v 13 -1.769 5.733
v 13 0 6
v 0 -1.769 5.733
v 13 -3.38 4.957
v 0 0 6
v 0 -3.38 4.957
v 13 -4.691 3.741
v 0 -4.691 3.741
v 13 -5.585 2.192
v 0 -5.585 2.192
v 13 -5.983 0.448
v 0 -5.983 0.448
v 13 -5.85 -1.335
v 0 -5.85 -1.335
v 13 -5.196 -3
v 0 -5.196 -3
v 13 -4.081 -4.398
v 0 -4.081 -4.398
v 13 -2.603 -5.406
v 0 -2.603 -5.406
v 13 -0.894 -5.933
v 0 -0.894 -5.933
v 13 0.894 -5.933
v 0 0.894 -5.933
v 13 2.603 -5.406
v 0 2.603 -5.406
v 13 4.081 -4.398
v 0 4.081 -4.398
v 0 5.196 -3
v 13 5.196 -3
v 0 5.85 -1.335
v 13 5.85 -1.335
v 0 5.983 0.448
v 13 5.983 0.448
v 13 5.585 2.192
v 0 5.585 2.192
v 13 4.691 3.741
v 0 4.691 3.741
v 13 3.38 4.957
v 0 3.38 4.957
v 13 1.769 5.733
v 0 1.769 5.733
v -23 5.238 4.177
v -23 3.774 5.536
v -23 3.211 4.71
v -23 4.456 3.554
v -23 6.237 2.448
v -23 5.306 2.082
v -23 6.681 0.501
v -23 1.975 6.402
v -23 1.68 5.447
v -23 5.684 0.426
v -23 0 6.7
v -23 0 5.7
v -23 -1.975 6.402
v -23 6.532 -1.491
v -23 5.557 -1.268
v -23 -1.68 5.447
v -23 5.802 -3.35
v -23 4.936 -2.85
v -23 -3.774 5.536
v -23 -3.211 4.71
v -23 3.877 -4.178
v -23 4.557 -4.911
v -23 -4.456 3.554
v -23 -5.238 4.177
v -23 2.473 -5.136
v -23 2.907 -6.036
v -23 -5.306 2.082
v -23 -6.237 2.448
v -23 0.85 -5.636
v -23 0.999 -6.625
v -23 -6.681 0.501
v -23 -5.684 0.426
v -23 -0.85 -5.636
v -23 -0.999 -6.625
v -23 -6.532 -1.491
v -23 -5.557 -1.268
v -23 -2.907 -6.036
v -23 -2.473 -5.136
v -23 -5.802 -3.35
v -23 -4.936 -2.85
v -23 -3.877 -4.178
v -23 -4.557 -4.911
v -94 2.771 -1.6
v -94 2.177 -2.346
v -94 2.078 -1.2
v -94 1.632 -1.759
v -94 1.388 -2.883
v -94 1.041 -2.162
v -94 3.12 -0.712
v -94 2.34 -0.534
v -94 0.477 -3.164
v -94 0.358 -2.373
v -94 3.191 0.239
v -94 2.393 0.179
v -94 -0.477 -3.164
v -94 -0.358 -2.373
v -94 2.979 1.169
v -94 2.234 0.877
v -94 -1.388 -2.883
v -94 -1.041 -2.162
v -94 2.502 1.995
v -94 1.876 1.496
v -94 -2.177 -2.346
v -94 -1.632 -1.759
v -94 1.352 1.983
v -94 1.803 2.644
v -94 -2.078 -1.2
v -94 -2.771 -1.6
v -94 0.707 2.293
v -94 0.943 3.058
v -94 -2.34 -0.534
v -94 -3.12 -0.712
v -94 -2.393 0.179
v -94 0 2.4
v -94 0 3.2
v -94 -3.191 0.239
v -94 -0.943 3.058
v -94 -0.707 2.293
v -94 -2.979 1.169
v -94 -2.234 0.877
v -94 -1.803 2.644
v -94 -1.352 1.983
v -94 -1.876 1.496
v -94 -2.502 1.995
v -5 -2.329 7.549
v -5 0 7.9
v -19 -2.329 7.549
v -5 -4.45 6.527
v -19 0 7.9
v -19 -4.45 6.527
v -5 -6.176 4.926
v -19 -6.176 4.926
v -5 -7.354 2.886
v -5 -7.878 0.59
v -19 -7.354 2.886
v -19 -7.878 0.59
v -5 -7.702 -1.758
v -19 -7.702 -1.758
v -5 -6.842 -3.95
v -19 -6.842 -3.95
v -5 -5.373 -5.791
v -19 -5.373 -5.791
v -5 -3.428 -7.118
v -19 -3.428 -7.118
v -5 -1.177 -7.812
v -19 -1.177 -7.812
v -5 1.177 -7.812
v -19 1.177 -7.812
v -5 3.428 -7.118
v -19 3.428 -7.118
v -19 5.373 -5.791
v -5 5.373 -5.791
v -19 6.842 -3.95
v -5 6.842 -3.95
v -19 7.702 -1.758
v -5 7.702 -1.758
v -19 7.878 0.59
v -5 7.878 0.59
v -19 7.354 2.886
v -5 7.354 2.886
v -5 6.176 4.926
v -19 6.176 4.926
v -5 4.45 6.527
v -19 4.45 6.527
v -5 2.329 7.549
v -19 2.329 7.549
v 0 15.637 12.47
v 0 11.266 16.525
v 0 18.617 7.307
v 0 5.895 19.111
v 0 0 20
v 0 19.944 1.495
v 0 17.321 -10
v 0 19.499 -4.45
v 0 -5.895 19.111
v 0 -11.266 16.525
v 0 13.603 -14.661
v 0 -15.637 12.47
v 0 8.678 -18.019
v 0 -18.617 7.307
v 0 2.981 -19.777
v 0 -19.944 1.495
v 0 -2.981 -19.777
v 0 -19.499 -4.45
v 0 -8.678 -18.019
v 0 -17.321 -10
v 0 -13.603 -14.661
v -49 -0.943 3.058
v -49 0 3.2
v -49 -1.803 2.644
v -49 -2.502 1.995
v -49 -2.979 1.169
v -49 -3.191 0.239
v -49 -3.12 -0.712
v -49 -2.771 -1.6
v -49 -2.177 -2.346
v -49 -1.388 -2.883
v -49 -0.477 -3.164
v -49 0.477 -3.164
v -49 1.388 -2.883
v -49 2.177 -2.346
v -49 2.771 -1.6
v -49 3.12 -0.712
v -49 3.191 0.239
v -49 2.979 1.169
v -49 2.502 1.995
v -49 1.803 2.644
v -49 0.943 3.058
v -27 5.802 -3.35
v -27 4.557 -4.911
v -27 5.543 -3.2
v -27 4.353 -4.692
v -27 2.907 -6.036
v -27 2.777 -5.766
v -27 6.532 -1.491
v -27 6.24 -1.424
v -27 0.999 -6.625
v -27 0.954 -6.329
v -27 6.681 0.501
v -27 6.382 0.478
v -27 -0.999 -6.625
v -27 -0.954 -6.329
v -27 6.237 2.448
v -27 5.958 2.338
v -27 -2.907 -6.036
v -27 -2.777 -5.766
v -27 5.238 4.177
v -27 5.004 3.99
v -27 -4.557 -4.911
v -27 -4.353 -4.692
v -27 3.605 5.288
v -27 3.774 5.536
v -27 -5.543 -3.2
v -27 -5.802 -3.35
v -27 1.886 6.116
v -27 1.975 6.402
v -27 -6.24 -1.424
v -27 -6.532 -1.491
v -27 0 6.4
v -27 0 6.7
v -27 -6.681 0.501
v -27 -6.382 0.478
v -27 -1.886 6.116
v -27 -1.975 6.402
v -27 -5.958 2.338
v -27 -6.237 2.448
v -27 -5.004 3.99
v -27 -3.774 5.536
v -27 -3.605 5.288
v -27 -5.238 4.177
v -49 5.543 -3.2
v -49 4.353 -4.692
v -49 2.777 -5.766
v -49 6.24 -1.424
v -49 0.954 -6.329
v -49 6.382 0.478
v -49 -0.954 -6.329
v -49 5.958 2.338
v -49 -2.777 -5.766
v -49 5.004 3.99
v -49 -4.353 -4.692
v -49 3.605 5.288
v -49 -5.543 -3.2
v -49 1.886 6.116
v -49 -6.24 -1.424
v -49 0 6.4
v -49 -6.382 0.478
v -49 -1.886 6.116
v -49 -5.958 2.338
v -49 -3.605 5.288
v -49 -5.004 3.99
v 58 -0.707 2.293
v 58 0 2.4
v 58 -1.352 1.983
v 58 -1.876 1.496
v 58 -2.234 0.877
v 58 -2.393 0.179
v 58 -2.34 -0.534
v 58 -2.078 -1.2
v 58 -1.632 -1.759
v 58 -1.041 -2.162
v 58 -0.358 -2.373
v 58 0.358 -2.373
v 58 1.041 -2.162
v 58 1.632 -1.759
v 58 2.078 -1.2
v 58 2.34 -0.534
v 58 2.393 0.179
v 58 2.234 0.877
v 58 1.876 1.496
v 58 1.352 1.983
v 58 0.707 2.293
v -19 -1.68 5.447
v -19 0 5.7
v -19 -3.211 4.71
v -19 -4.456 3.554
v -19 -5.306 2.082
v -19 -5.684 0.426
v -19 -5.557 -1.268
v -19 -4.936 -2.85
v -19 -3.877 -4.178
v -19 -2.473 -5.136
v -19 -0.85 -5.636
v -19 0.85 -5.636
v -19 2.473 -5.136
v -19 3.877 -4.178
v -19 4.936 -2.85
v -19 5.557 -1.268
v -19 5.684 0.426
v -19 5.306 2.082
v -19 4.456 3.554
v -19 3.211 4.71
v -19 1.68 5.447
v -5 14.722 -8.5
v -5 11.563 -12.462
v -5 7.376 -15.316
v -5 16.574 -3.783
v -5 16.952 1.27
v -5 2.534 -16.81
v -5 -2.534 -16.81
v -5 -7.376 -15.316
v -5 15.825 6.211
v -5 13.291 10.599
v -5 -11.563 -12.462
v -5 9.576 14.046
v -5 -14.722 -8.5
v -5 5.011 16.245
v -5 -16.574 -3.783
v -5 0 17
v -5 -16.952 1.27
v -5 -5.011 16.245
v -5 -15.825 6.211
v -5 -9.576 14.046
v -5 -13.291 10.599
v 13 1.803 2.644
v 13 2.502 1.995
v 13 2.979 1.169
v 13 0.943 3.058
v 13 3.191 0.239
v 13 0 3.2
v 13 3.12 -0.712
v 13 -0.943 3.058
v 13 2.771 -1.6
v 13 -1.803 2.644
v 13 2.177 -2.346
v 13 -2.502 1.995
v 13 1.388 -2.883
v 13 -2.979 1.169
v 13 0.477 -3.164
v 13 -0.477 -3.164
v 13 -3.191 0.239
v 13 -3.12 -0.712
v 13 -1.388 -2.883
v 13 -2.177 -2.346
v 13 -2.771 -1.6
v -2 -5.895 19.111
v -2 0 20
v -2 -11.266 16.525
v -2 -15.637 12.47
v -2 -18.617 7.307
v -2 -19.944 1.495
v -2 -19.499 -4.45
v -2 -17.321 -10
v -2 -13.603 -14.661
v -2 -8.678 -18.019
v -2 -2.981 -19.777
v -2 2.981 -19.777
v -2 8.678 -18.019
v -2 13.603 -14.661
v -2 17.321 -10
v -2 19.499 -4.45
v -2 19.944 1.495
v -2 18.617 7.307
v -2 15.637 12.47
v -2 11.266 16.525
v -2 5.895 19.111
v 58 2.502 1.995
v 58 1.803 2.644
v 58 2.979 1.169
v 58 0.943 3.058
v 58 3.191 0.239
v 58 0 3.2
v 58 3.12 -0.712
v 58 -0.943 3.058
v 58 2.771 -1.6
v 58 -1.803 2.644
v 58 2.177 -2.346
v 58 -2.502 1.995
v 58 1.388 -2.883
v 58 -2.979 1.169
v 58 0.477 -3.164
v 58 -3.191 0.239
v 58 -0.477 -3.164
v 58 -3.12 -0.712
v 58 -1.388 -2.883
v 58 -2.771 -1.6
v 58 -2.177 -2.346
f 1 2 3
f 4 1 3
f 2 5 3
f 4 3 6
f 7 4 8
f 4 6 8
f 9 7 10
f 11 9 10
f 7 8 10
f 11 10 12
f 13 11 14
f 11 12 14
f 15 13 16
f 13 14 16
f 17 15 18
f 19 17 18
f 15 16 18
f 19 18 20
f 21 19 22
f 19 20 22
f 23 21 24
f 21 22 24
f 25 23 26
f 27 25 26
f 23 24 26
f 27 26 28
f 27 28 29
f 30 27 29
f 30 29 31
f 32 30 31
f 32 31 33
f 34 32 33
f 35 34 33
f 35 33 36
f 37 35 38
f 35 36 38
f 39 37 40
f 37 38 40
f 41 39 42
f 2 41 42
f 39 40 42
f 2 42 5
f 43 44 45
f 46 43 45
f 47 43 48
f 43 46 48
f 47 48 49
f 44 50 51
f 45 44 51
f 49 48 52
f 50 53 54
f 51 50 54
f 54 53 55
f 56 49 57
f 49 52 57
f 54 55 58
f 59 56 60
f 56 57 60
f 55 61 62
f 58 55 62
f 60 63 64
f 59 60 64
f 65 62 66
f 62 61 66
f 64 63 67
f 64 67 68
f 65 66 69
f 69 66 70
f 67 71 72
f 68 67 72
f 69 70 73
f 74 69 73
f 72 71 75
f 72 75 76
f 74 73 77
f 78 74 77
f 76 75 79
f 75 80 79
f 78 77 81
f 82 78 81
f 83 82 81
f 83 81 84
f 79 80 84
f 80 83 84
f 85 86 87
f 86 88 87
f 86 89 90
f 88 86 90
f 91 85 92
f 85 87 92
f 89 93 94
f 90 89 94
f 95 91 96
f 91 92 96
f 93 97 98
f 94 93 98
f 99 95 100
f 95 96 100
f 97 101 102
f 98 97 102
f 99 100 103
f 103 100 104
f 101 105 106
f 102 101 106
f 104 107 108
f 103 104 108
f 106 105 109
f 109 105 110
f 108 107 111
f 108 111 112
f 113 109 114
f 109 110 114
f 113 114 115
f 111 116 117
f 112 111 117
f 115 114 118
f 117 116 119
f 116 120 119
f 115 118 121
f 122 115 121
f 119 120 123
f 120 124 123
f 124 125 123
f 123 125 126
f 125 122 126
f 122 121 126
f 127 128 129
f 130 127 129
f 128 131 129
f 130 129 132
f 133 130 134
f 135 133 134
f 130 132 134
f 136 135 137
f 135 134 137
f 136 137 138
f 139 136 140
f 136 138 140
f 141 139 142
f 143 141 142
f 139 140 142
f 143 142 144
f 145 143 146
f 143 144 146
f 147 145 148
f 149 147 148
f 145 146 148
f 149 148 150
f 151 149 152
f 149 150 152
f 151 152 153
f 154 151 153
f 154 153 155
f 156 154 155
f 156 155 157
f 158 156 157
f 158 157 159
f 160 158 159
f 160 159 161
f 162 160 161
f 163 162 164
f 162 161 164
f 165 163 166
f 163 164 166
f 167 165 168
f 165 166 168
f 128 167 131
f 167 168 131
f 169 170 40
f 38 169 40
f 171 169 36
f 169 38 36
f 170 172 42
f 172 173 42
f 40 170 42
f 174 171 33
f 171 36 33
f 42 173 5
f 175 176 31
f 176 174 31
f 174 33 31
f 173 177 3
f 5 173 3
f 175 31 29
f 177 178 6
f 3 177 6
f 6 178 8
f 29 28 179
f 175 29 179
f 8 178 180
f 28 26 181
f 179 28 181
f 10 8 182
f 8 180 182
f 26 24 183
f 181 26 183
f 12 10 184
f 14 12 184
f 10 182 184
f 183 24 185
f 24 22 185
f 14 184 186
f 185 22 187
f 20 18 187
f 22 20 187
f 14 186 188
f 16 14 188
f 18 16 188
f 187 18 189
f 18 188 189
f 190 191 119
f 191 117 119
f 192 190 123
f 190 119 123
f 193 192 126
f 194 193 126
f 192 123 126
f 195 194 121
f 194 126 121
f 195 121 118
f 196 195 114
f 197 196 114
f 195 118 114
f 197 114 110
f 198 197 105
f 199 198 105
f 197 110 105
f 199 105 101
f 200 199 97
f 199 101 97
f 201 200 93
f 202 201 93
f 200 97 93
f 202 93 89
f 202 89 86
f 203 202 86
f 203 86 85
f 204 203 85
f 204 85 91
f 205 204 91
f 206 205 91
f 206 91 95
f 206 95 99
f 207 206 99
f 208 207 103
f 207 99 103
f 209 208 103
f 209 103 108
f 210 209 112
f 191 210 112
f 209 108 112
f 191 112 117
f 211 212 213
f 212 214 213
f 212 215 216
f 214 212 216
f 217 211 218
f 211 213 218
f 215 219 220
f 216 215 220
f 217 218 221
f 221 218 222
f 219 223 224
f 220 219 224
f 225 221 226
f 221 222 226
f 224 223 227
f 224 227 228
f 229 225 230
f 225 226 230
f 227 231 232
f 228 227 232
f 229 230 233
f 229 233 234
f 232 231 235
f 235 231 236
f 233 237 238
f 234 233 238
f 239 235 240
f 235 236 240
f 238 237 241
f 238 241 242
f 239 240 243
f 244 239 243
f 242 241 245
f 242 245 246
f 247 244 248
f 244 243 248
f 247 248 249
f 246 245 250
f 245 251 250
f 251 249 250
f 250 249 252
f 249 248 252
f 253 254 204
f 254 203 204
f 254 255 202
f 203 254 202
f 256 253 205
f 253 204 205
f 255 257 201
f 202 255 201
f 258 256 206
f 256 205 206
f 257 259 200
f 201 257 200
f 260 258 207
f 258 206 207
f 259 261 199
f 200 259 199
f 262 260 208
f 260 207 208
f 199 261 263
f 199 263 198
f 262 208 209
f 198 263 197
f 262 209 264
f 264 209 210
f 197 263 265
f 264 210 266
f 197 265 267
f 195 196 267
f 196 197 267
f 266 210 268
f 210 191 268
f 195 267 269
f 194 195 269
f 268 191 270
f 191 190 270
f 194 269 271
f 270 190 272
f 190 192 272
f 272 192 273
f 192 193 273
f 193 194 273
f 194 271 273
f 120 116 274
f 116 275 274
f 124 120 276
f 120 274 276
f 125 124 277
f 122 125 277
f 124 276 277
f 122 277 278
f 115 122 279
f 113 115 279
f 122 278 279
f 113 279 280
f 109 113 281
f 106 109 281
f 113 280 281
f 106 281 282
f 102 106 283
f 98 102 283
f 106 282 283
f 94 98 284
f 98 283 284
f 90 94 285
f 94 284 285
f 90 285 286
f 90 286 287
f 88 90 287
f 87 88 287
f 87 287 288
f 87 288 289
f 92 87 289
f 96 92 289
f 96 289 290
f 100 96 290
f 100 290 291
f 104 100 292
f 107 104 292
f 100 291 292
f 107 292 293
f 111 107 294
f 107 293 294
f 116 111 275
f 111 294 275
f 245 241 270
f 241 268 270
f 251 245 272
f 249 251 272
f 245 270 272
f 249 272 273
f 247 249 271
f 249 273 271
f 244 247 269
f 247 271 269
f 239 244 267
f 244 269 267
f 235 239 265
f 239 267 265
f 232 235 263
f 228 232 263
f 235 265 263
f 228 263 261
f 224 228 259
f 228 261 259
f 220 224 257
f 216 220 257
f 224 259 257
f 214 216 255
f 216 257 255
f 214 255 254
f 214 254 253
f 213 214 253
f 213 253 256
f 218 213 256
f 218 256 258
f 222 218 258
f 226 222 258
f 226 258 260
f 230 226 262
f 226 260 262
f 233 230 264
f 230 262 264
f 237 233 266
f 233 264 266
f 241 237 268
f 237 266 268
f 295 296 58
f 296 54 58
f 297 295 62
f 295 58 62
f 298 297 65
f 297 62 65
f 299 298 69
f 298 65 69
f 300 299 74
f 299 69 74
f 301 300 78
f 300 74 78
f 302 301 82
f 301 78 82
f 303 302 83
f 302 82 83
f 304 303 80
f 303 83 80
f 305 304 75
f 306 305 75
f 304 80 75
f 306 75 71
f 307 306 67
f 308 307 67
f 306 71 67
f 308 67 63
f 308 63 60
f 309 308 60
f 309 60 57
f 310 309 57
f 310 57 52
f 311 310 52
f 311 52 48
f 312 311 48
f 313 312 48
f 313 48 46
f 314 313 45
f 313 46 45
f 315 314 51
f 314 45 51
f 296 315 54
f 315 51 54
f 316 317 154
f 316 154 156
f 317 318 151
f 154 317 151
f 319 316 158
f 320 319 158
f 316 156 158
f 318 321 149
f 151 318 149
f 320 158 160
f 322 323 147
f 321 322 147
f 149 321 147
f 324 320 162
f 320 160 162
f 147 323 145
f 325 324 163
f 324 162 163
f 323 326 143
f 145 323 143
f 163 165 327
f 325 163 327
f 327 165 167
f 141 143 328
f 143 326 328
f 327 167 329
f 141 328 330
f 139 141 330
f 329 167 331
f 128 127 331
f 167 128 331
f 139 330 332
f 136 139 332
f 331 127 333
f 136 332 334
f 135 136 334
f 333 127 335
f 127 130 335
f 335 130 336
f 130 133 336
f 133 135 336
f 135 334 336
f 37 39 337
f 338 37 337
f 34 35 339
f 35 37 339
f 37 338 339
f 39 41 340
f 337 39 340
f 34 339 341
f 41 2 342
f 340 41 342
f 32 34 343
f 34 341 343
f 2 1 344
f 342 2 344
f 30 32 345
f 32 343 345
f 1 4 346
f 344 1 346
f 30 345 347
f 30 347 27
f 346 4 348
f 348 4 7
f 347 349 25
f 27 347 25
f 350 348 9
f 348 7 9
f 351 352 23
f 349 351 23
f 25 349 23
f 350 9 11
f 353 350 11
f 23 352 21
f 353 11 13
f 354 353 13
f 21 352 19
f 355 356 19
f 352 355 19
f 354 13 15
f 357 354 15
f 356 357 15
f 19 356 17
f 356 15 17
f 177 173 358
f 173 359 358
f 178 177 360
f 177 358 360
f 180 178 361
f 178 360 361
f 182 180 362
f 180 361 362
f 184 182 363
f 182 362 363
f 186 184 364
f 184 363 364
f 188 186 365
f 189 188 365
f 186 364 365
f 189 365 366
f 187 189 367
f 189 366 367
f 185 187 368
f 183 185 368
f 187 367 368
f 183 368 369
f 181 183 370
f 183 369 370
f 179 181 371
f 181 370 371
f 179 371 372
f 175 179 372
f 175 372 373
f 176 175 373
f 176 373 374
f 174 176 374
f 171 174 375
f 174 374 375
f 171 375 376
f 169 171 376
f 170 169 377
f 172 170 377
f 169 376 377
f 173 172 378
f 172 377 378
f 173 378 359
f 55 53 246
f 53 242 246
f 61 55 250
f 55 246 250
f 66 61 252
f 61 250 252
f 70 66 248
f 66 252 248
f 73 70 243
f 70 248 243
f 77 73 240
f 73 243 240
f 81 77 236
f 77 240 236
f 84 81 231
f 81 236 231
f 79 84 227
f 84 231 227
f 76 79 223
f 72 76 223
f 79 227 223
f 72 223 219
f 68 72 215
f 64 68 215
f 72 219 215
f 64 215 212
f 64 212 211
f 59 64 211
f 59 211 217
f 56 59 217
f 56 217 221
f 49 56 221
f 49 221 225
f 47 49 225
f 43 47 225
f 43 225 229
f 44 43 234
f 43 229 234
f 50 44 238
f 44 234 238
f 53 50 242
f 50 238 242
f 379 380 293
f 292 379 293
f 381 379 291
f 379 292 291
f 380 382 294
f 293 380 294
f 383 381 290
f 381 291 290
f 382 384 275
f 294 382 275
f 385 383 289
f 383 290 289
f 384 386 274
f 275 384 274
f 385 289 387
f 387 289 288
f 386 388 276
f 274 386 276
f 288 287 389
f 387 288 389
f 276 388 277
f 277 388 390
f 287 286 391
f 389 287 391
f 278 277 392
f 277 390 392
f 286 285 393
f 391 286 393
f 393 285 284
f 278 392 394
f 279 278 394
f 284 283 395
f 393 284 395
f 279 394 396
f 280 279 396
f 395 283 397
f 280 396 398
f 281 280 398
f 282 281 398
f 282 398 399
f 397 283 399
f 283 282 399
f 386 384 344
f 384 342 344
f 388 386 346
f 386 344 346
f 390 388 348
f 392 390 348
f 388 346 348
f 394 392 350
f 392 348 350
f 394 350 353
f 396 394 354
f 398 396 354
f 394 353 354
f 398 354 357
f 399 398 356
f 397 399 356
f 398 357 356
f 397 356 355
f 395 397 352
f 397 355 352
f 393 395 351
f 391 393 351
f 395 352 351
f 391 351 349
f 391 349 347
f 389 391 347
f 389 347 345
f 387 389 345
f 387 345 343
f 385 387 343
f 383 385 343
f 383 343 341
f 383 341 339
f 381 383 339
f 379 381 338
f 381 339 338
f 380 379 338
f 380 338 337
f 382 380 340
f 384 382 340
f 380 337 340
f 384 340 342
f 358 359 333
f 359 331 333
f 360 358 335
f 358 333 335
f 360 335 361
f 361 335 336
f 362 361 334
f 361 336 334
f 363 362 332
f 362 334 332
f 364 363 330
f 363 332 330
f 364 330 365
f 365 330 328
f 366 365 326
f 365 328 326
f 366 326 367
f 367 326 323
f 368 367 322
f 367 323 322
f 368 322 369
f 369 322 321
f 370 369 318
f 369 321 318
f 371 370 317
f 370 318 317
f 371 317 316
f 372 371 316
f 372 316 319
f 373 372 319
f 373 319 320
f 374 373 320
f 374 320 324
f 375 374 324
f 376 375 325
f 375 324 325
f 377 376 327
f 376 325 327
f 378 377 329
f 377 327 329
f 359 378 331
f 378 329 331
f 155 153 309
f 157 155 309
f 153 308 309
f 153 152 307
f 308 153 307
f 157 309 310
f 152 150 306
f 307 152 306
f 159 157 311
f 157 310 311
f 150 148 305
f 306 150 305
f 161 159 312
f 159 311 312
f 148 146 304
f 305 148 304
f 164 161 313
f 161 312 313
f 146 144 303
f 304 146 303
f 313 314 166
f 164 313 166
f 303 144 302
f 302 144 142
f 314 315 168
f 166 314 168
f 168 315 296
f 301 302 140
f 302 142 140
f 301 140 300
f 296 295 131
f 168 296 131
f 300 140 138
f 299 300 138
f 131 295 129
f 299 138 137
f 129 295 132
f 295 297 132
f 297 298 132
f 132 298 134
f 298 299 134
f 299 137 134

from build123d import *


with BuildPart() as part:
    # Axial profile (mm) → Full revolution (revolve)
    with BuildSketch(Plane.XY, mode=Mode.PRIVATE) as full_revolution_sk:
        Polygon((-94, 2.4), (58, 2.4), (58, 3.2), (13, 3.2), (13, 6), (0, 6), (0, 20), (-2, 20), (-5, 17), (-5, 7.9), (-19, 7.9), (-19, 5.7), (-23, 5.7), (-23, 6.7), (-27, 6.7), (-27, 6.4), (-49, 6.4), (-49, 3.2), (-94, 3.2), align=None)
    revolve(full_revolution_sk.sketch.rotate(Axis((-110, 0, 0), (1, 0, 0)), 90), axis=Axis((-110, 0, 0), (1, 0, 0)))


solid = part.part
